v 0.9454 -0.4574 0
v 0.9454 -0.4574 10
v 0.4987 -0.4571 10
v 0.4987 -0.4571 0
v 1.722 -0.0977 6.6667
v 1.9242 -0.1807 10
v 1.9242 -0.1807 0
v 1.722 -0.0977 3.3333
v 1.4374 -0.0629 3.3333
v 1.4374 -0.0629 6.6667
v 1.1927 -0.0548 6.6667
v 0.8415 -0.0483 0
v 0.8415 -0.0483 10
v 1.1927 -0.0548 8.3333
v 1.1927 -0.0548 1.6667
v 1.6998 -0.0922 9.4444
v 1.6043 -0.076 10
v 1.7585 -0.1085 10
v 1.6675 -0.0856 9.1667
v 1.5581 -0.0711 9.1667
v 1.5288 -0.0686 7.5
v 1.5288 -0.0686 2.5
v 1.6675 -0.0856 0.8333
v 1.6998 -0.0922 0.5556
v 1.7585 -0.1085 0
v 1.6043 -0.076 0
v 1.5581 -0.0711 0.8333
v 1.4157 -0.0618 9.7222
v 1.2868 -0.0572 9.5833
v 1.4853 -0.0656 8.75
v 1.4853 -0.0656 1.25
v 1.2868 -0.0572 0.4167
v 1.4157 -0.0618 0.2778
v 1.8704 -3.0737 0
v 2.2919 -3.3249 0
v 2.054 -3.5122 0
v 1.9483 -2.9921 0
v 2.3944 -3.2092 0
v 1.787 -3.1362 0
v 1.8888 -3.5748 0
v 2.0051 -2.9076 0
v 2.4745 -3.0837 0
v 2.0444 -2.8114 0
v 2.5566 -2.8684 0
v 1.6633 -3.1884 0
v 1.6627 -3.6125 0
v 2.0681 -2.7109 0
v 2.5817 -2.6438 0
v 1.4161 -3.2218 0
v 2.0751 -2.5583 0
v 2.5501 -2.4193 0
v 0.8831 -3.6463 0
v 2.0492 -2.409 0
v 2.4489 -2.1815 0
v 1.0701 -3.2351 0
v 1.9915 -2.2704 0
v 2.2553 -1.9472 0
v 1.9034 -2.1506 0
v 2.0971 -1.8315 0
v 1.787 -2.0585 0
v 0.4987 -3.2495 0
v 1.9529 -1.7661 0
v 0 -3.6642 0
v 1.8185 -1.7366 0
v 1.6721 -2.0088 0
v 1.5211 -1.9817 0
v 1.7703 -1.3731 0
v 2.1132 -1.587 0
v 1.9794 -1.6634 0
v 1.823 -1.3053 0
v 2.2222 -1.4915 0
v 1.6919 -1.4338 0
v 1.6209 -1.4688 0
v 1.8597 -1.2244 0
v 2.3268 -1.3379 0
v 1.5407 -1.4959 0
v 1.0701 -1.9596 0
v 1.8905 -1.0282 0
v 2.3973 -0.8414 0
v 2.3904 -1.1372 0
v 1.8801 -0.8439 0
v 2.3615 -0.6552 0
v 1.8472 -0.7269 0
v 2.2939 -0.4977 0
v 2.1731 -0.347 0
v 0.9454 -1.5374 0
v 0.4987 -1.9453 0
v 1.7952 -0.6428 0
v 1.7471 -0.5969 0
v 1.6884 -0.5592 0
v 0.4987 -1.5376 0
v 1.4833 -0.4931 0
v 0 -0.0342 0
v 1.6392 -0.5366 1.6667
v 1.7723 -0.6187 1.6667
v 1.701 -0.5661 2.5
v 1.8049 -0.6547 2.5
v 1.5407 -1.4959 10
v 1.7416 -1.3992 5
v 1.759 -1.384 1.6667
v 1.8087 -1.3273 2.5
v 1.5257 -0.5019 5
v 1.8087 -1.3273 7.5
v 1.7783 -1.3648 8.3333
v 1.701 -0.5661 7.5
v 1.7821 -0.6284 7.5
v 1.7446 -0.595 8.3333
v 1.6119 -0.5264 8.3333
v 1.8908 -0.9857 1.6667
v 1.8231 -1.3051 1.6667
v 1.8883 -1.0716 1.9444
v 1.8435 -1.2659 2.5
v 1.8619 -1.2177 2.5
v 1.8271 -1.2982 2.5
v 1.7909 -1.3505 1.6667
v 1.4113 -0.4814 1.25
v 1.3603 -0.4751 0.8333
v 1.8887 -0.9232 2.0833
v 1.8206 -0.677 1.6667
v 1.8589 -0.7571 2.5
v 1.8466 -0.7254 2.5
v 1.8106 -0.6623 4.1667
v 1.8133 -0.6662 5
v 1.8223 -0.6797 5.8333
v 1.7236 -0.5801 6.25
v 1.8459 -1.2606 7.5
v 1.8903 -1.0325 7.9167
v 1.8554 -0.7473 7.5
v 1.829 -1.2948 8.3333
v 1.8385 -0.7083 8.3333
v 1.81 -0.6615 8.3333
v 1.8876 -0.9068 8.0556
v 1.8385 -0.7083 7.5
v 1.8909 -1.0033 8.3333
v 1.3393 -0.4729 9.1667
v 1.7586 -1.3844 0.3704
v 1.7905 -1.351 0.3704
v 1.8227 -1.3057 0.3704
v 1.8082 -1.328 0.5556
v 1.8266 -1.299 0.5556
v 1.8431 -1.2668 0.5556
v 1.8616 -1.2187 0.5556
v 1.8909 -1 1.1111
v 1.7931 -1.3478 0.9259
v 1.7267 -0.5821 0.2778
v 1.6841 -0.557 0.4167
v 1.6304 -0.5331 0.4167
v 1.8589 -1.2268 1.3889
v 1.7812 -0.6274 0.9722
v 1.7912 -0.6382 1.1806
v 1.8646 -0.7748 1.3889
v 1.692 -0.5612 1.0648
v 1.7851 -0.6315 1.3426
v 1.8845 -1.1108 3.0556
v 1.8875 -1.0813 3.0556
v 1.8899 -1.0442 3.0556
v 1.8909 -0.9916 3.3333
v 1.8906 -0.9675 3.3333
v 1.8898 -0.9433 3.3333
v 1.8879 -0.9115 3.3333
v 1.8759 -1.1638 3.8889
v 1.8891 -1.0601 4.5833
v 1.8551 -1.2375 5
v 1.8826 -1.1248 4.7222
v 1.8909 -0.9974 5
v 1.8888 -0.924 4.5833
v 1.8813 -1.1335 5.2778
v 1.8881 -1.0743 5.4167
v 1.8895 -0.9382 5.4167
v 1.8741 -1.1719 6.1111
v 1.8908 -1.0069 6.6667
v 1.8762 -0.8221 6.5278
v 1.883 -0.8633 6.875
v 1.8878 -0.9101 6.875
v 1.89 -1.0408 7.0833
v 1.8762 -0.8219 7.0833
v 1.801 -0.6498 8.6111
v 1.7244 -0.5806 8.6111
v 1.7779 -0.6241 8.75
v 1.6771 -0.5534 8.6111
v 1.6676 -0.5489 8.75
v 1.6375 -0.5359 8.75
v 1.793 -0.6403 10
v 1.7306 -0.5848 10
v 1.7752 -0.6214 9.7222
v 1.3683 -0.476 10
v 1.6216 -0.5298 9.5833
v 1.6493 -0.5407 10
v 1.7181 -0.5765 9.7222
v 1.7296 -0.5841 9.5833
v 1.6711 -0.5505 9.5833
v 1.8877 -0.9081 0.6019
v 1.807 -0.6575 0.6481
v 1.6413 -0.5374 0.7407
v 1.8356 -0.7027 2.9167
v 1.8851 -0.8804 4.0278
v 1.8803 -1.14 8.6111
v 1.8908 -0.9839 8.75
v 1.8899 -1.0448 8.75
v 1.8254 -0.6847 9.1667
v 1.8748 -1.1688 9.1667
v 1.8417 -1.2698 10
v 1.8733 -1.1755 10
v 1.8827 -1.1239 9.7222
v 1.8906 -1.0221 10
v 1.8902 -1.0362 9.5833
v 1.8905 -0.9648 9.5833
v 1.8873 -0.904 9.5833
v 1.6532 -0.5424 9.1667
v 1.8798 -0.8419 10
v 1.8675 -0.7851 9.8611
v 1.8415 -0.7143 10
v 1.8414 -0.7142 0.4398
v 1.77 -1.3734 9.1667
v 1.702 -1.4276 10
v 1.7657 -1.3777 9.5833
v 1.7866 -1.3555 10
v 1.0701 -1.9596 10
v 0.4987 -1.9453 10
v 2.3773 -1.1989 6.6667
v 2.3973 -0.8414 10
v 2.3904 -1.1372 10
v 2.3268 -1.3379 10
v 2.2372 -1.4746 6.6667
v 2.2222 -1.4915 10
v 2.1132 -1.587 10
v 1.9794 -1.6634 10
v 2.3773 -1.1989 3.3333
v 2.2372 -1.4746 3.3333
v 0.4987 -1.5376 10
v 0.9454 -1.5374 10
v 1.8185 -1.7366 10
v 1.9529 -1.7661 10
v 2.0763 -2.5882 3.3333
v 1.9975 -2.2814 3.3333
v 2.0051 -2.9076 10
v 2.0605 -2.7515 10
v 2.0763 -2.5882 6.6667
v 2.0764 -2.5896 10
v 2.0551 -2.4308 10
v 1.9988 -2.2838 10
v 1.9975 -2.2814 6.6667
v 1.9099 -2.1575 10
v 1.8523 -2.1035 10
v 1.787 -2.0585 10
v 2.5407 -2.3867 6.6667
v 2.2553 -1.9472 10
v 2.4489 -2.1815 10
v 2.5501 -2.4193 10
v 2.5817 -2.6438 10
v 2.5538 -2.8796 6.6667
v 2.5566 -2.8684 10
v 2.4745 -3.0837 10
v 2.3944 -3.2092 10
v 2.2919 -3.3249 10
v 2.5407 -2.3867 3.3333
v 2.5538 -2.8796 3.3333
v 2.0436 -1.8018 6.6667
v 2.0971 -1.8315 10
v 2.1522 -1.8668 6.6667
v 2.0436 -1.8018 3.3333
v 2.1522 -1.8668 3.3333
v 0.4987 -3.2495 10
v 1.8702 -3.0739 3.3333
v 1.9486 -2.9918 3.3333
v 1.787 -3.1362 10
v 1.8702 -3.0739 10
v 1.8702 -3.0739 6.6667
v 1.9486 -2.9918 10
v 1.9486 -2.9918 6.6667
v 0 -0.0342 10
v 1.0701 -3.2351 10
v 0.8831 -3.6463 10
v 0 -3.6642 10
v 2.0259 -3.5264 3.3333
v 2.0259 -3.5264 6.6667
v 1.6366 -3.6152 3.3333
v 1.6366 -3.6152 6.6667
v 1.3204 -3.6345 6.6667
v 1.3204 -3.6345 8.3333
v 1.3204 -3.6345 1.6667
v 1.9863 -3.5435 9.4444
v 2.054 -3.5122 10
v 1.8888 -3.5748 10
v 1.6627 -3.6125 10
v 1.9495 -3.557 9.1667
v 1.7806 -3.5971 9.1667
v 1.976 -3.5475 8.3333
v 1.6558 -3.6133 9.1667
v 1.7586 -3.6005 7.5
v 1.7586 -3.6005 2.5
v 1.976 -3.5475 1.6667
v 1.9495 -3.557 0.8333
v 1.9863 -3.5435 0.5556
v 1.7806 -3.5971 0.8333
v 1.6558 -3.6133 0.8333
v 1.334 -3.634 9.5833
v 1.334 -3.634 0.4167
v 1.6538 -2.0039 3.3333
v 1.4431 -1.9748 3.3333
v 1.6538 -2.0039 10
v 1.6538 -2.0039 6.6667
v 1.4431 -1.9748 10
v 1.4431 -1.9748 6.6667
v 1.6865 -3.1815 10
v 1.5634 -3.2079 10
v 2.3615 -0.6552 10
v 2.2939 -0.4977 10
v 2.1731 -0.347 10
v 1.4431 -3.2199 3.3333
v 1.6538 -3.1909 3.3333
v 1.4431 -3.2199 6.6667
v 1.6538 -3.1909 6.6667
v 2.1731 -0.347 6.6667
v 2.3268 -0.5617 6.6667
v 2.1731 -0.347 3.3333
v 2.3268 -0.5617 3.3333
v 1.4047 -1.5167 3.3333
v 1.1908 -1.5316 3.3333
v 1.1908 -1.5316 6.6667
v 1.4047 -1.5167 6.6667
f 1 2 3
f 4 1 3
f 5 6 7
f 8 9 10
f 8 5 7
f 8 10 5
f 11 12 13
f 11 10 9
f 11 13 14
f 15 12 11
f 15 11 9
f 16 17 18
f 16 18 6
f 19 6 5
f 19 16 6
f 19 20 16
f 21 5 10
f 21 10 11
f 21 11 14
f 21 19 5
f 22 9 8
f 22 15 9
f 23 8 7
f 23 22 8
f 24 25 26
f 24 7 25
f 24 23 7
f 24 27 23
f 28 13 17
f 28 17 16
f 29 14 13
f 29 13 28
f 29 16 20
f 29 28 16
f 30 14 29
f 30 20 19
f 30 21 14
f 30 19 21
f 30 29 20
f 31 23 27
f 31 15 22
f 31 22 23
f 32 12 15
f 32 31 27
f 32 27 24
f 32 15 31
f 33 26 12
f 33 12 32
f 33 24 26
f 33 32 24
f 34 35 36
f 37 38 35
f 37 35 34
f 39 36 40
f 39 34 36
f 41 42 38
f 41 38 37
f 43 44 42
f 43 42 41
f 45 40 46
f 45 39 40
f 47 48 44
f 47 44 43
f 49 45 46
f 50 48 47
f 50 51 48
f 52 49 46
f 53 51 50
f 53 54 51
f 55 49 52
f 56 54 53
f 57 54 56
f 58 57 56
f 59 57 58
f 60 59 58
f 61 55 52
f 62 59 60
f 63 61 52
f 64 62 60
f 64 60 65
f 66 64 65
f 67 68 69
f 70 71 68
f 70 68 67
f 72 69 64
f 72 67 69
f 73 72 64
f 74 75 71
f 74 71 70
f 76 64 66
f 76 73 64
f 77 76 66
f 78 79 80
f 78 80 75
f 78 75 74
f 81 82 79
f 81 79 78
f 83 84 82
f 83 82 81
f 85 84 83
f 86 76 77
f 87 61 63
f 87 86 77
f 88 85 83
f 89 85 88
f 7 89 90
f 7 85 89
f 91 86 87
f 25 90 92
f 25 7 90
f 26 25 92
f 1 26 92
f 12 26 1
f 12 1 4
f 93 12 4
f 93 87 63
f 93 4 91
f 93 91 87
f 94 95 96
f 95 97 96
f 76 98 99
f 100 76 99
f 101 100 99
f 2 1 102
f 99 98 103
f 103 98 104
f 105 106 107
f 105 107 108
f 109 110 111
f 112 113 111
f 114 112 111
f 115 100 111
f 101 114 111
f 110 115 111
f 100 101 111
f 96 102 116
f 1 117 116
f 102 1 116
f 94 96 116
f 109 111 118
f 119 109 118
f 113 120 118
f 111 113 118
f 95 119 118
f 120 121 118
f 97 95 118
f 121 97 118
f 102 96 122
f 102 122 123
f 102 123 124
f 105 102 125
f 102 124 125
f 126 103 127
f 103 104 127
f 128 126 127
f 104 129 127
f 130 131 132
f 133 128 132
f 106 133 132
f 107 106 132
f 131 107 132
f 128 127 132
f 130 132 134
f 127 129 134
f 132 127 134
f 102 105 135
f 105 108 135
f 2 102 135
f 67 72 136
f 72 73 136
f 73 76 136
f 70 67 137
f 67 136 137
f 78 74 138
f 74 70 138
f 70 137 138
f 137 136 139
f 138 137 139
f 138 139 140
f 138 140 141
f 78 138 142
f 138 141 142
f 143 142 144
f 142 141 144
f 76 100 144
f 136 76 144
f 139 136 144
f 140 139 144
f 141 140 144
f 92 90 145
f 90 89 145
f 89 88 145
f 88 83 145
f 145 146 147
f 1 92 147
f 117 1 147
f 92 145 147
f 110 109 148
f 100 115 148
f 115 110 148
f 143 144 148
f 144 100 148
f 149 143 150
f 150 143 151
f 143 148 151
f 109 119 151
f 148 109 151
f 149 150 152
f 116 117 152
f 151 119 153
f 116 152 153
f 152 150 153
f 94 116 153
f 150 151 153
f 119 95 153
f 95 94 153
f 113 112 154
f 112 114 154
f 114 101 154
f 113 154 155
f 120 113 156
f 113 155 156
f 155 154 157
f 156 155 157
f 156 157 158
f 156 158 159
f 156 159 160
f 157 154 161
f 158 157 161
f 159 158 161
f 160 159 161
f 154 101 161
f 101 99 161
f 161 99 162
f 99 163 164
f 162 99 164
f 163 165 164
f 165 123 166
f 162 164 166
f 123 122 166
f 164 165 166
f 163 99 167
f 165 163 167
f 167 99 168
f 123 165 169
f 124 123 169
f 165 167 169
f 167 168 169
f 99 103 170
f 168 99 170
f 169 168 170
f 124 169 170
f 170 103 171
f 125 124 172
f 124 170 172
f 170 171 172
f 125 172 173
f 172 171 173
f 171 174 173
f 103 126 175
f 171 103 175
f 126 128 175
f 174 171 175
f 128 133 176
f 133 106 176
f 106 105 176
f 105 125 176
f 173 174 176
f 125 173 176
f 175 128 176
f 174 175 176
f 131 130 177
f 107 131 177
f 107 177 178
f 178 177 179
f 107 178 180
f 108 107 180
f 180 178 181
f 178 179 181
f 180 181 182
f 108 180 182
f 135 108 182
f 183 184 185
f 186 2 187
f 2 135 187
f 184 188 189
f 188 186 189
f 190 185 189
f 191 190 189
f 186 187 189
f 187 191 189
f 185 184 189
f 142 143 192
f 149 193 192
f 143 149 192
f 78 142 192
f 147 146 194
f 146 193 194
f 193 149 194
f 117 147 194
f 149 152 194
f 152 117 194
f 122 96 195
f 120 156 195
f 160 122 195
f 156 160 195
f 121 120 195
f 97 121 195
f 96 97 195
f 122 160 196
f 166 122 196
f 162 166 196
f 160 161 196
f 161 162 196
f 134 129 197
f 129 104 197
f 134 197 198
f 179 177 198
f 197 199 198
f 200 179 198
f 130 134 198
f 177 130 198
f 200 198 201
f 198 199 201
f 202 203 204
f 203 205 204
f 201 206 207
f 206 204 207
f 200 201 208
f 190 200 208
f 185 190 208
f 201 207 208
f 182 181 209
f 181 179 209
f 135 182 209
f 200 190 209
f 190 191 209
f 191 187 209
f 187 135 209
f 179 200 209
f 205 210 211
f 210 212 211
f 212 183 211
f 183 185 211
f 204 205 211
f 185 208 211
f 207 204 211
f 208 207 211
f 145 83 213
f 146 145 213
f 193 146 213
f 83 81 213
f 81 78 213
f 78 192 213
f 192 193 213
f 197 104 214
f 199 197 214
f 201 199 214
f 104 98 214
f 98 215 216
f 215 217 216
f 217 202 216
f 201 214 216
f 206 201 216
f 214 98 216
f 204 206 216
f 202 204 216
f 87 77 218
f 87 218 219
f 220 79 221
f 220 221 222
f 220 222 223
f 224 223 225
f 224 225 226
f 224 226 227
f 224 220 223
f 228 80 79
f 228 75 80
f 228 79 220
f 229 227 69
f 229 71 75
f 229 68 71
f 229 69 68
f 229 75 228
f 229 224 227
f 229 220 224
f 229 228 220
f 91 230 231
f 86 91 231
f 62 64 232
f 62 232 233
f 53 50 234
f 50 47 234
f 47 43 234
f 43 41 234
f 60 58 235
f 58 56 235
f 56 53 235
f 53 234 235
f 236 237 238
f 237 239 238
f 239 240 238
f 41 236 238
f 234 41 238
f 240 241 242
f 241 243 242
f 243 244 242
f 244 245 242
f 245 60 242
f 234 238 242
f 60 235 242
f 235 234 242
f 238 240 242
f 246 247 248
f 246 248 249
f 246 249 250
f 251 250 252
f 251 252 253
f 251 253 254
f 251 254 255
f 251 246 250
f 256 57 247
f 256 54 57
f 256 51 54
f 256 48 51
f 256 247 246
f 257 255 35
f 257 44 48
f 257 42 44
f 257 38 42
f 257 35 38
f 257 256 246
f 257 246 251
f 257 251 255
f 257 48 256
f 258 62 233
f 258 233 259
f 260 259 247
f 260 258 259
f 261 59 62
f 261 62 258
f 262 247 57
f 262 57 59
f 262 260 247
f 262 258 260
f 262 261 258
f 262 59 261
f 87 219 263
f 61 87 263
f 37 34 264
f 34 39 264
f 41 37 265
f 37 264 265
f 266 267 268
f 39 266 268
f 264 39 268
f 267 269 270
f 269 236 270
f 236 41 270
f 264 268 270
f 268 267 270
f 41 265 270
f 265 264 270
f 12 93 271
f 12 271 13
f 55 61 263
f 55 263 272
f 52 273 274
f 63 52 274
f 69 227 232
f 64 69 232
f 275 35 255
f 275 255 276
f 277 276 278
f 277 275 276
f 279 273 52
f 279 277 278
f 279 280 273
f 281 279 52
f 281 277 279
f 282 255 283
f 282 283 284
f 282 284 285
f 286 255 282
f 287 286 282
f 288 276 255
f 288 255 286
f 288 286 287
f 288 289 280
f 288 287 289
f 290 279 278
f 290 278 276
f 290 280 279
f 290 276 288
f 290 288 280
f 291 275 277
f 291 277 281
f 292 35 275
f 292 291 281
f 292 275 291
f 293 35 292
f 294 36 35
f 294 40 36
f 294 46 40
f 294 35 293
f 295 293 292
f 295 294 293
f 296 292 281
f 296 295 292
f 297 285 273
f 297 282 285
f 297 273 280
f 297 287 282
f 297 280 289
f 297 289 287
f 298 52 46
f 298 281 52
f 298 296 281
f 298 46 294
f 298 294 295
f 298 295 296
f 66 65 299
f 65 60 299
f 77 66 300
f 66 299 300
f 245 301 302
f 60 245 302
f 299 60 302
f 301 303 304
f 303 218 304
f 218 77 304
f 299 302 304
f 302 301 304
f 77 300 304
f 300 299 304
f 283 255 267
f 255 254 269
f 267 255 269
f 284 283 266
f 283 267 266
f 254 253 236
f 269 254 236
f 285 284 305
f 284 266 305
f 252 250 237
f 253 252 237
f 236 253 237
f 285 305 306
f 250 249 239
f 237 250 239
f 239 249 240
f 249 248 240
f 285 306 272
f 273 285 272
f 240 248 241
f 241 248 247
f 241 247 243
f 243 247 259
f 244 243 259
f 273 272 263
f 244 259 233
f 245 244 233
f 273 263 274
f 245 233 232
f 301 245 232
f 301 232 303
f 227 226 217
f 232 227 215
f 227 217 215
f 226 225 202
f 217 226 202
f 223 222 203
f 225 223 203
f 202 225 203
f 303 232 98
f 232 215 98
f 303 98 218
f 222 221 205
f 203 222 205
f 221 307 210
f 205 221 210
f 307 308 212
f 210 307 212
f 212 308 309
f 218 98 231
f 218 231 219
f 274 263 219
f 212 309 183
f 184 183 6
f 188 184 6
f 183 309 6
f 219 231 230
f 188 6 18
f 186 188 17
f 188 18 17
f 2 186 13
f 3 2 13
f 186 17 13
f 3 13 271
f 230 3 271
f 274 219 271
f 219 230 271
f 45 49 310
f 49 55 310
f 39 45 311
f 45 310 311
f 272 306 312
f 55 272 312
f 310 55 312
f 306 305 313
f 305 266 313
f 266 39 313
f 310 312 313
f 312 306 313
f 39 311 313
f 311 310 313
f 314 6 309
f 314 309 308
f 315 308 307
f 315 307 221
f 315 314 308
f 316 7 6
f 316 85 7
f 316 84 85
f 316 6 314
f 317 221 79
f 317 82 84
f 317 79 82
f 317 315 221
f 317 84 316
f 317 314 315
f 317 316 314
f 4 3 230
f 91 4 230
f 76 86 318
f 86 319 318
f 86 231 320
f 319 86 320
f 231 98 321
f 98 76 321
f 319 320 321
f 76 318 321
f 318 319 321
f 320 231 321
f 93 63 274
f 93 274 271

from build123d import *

# Parameters (mm, degrees)
PAD001_DEPTH    = 10
POCKET_DEPTH    = 10.001
POCKET001_DEPTH = 10.001


with BuildPart() as part:
    # Sketch009 → Pad001 (new body)
    with BuildSketch(Plane.XY):
        with BuildLine():
            add(Edge.make_bspline(
                [(0, -1.849196), (0, -0.034171)],
                knots=[0, 0, 6.43119, 6.43119], degree=1))
            add(Edge.make_bspline(
                [(0, -0.034171), (0.841544, -0.048254)],
                knots=[0, 0, 2.982267, 2.982267], degree=1))
            add(Edge.make_bspline(
                [(0.841544, -0.048254), (1.669189, -0.062111), (1.687071, -0.064285), (1.924166, -0.180713)],
                knots=[0, 0, 0, 0, 1, 1, 1, 1], degree=3))
            add(Edge.make_bspline(
                [(1.924166, -0.180713), (2.2246, -0.328239), (2.3645, -0.523607), (2.397303, -0.84144)],
                knots=[0, 0, 0, 0, 1, 1, 1, 1], degree=3))
            add(Edge.make_bspline(
                [(2.397303, -0.84144), (2.438256, -1.238239), (2.295169, -1.519628), (1.979351, -1.663384)],
                knots=[0, 0, 0, 0, 1, 1, 1, 1], degree=3))
            add(Edge.make_bspline(
                [(1.979351, -1.663384), (1.818476, -1.736609)],
                knots=[0, 0, 0.626302, 0.626302], degree=1))
            add(Edge.make_bspline(
                [(1.818476, -1.736609), (1.952851, -1.766124)],
                knots=[0, 0, 0.48748, 0.48748], degree=1))
            add(Edge.make_bspline(
                [(1.952851, -1.766124), (2.026759, -1.782352), (2.162852, -1.863818), (2.255283, -1.947153)],
                knots=[0, 0, 0, 0, 1, 1, 1, 1], degree=3))
            add(Edge.make_bspline(
                [(2.255283, -1.947153), (2.675938, -2.326397), (2.692169, -2.936934), (2.291915, -3.324947)],
                knots=[0, 0, 0, 0, 1, 1, 1, 1], degree=3))
            add(Edge.make_bspline(
                [(2.291915, -3.324947), (2.007164, -3.600986), (1.898949, -3.625672), (0.883102, -3.646294)],
                knots=[0, 0, 0, 0, 1, 1, 1, 1], degree=3))
            add(Edge.make_bspline(
                [(0.883102, -3.646294), (0, -3.664215)],
                knots=[0, 0, 3.129744, 3.129744], degree=1))
            add(Edge.make_bspline(
                [(0, -3.664215), (0, -1.849196)],
                knots=[0, 0, 6.43117, 6.43117], degree=1))
        make_face()
    extrude(amount=PAD001_DEPTH)

    # Sketch010 (on Face14 of Pad001) → Pocket (cut, through all)
    with BuildSketch(Plane.XY.offset(10)):
        with BuildLine():
            add(Edge.make_bspline(
                [(1.786983, -3.136194), (1.866979, -3.089704), (1.965133, -2.986848), (2.005096, -2.907625)],
                knots=[0, 0, 0, 0, 1, 1, 1, 1], degree=3))
            add(Edge.make_bspline(
                [(2.005096, -2.907625), (2.157451, -2.605611), (2.057265, -2.215594), (1.786983, -2.05852)],
                knots=[0, 0, 0, 0, 1, 1, 1, 1], degree=3))
            add(Edge.make_bspline(
                [(1.786983, -2.05852), (1.664183, -1.987158), (1.55253, -1.971754), (1.070113, -1.959618)],
                knots=[0, 0, 0, 0, 1, 1, 1, 1], degree=3))
            add(Edge.make_bspline(
                [(1.070113, -1.959618), (0.498692, -1.945253)],
                knots=[0, 0, 2.02536, 2.02536], degree=1))
            add(Edge.make_bspline(
                [(0.498692, -1.945253), (0.498692, -2.597367)],
                knots=[0, 0, 2.31064, 2.31064], degree=1))
            add(Edge.make_bspline(
                [(0.498692, -2.597367), (0.498692, -3.249484)],
                knots=[0, 0, 2.31065, 2.31065], degree=1))
            add(Edge.make_bspline(
                [(0.498692, -3.249484), (1.070113, -3.235119)],
                knots=[0, 0, 2.02536, 2.02536], degree=1))
            add(Edge.make_bspline(
                [(1.070113, -3.235119), (1.55253, -3.222983), (1.664183, -3.207574), (1.786983, -3.136214)],
                knots=[0, 0, 0, 0, 1, 1, 1, 1], degree=3))
            add(Edge.make_bspline(
                [(1.786983, -3.136214), (1.786983, -3.136194)],
                knots=[0, 0, 7e-05, 7e-05], degree=1))
        make_face()
    extrude(amount=-POCKET_DEPTH, mode=Mode.SUBTRACT)

    # Sketch007 (on Face14 of Pad001) → Pocket001 (cut, through all)
    with BuildSketch(Plane.XY.offset(10)):
        with BuildLine():
            add(Edge.make_bspline(
                [(1.540722, -1.49591), (1.788411, -1.427102), (1.890878, -1.281218), (1.890878, -0.997385)],
                knots=[0, 0, 0, 0, 1, 1, 1, 1], degree=3))
            add(Edge.make_bspline(
                [(1.890878, -0.997385), (1.890878, -0.567038), (1.699553, -0.457759), (0.945439, -0.457367)],
                knots=[0, 0, 0, 0, 1, 1, 1, 1], degree=3))
            add(Edge.make_bspline(
                [(0.945439, -0.457367), (0.498692, -0.457135)],
                knots=[0, 0, 1.58296, 1.58296], degree=1))
            add(Edge.make_bspline(
                [(0.498692, -0.457135), (0.498692, -0.997387)],
                knots=[0, 0, 1.91428, 1.91428], degree=1))
            add(Edge.make_bspline(
                [(0.498692, -0.997387), (0.498692, -1.537637)],
                knots=[0, 0, 1.91427, 1.91427], degree=1))
            add(Edge.make_bspline(
                [(0.498692, -1.537637), (0.945439, -1.537389)],
                knots=[0, 0, 1.58296, 1.58296], degree=1))
            add(Edge.make_bspline(
                [(0.945439, -1.537389), (1.19115, -1.537262), (1.459024, -1.518593), (1.540722, -1.495893)],
                knots=[0, 0, 0, 0, 1, 1, 1, 1], degree=3))
            add(Edge.make_bspline(
                [(1.540722, -1.495893), (1.540722, -1.49591)],
                knots=[0, 0, 6e-05, 6e-05], degree=1))
        make_face()
    extrude(amount=-POCKET001_DEPTH, mode=Mode.SUBTRACT)


solid = part.part
